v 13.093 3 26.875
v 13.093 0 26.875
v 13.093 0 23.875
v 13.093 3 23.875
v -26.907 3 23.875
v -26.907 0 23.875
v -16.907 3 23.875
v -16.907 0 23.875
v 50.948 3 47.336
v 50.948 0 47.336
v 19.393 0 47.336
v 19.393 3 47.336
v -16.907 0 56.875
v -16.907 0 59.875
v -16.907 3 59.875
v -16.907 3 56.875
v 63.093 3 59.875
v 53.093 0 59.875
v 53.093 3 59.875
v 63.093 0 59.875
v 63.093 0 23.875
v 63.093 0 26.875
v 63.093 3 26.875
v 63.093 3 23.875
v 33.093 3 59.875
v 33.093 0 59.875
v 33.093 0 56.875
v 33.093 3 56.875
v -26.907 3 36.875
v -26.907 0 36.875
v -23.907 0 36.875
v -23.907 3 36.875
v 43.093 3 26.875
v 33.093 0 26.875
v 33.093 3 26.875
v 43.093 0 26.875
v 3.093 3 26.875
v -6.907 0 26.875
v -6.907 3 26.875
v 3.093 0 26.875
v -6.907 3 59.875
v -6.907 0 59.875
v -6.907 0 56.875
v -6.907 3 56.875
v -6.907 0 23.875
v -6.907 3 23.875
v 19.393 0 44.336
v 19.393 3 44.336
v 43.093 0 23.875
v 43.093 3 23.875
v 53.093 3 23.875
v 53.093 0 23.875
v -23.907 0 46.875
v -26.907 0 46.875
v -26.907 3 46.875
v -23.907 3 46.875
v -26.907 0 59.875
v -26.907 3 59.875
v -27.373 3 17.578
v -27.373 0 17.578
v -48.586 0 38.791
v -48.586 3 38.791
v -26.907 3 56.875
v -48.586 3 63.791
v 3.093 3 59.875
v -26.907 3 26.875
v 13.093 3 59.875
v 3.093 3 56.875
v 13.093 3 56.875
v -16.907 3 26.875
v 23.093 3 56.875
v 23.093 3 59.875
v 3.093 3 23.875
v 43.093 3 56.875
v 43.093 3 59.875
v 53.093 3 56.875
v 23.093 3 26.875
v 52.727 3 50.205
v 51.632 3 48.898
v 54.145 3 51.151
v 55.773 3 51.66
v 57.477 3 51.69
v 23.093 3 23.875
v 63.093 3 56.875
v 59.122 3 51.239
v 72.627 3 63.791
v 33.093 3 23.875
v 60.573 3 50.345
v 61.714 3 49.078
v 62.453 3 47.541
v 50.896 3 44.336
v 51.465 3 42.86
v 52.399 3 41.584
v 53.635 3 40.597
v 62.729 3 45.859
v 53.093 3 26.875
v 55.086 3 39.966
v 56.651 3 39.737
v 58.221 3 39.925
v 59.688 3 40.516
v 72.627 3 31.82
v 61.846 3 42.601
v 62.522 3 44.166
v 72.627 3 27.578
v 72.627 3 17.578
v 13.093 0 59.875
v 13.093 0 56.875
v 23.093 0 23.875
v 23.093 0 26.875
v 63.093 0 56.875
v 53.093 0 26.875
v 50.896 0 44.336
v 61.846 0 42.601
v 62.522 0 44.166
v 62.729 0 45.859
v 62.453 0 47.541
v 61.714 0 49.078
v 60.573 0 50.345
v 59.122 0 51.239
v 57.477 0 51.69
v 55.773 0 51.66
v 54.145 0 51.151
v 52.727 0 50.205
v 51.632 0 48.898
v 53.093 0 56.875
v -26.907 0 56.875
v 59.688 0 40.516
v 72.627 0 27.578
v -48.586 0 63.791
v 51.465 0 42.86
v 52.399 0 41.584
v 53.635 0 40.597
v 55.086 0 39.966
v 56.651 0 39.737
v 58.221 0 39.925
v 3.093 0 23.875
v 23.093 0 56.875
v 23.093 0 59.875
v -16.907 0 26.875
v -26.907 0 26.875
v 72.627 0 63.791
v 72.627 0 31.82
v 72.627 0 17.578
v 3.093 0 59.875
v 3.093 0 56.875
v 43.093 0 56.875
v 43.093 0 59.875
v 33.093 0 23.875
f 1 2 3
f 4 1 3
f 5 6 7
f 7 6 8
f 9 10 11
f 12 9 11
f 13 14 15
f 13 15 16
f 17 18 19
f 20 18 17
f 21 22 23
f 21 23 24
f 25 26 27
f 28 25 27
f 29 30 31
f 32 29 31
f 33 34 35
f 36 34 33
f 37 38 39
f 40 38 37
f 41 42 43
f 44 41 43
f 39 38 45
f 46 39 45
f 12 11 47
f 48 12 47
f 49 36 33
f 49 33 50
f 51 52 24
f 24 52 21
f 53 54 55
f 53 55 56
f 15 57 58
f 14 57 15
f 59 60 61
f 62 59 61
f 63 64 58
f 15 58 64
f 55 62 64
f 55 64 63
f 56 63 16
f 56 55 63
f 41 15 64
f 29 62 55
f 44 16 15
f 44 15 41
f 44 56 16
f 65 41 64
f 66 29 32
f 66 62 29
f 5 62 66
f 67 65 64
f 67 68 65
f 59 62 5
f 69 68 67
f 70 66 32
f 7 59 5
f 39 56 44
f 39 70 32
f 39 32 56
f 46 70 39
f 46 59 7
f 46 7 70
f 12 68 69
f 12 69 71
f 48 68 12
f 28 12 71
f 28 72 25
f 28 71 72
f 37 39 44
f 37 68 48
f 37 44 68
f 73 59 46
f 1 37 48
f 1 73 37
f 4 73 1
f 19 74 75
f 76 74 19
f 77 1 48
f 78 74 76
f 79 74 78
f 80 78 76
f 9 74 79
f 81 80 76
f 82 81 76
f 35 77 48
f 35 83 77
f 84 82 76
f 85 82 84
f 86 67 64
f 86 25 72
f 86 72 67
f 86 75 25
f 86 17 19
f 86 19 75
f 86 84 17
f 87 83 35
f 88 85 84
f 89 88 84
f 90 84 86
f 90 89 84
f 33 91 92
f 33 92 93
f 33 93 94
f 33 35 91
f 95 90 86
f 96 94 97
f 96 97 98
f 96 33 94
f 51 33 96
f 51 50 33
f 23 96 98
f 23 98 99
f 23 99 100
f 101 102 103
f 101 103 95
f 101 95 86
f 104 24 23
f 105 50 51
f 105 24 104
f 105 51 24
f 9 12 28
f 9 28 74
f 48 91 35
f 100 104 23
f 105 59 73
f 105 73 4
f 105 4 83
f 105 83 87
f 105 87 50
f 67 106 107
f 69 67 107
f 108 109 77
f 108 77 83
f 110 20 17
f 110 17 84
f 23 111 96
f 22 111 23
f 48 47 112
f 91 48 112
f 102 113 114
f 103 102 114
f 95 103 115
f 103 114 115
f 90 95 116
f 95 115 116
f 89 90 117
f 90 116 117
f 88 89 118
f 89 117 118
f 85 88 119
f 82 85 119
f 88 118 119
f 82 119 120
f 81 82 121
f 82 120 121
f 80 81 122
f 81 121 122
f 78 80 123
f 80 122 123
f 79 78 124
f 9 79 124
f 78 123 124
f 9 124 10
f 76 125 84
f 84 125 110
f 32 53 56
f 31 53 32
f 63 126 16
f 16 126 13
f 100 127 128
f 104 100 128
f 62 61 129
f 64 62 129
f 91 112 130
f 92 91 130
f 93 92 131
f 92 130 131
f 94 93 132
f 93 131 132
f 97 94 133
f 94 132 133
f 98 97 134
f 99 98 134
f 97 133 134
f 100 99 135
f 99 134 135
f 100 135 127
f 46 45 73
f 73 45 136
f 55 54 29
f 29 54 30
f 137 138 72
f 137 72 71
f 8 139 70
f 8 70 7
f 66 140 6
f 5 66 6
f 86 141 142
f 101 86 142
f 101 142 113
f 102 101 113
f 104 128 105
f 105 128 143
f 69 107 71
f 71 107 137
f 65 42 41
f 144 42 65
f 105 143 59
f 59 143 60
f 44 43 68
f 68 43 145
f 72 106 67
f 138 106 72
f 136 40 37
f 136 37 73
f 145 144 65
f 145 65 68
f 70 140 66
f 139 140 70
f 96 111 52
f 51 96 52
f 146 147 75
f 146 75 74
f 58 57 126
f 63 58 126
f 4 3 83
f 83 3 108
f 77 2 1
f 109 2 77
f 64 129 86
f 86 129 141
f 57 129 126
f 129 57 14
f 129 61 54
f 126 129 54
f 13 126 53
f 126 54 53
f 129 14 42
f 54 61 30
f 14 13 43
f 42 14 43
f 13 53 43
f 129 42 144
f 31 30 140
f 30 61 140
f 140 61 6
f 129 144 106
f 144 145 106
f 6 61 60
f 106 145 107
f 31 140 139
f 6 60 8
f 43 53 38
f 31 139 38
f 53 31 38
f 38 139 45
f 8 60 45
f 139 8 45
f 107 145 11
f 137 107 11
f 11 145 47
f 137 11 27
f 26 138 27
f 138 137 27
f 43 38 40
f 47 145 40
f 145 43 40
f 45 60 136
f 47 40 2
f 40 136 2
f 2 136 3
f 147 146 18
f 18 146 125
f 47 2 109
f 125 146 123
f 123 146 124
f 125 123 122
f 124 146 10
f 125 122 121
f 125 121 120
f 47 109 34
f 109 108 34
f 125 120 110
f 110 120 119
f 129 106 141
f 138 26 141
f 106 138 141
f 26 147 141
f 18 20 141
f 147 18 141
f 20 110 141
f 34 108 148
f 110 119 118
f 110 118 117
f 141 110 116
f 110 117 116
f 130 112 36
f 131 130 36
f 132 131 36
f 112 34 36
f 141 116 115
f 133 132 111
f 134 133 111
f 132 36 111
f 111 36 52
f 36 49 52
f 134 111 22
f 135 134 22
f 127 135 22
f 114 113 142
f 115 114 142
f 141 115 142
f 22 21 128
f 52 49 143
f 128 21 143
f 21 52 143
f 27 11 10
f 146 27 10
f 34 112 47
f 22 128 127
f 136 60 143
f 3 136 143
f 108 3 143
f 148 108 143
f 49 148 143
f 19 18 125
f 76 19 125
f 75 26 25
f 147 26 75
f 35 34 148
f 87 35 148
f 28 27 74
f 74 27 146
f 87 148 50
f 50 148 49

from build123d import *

# Parameters (mm, degrees)
ESQUISSE1_W        = 10
ESQUISSE1_H        = 3
ESQUISSE1_W_2      = 3
ESQUISSE1_H_2      = 10
BOSS_EXTRU_1_DEPTH = 3


with BuildPart() as part:
    # Esquisse1 → Boss.-Extru.1 (new body)
    with BuildSketch(Plane(origin=(0, 0, 0), x_dir=(1, 0, 0), z_dir=(0, 1, 0))):
        with BuildLine():
            Line((-48.586354215, -63.79082471), (72.626849221, -63.79082471))
            Line((72.626849221, -63.79082471), (72.626849221, -31.820261962))
            Line((72.626849221, -31.820261962), (61.846203207, -42.600907976))
            ThreePointArc((61.846203207, -42.600907976), (59.121902654, -51.239420877), (50.947990526, -47.336488751))
            Line((50.947990526, -47.336488751), (19.393465144, -47.336488751))
            Line((19.393465144, -47.336488751), (19.393465144, -44.336488751))
            Line((19.393465144, -44.336488751), (50.896342586, -44.336488751))
            ThreePointArc((50.896342586, -44.336488751), (54.339544234, -40.233556625), (59.688362254, -40.516108241))
            Line((59.688362254, -40.516108241), (72.626849221, -27.577621274))
            Line((72.626849221, -27.577621274), (72.626849221, -17.577621274))
            Line((72.626849221, -17.577621274), (-27.373150779, -17.577621274))
            Line((-27.373150779, -17.577621274), (-48.586354215, -38.79082471))
            Line((-48.586354215, -38.79082471), (-48.586354215, -63.79082471))
        make_face()
        with Locations((-1.907227595, -25.374770958)):
            Rectangle(ESQUISSE1_W, ESQUISSE1_H, mode=Mode.SUBTRACT)
        with Locations((-21.907227595, -25.374770958)):
            Rectangle(ESQUISSE1_W, ESQUISSE1_H, mode=Mode.SUBTRACT)
        with Locations((18.092772405, -25.374770958)):
            Rectangle(ESQUISSE1_W, ESQUISSE1_H, mode=Mode.SUBTRACT)
        with Locations((38.092772405, -25.374770958)):
            Rectangle(ESQUISSE1_W, ESQUISSE1_H, mode=Mode.SUBTRACT)
        with Locations((58.092772405, -25.374770958)):
            Rectangle(ESQUISSE1_W, ESQUISSE1_H, mode=Mode.SUBTRACT)
        with Locations((-21.907227595, -58.374770958)):
            Rectangle(ESQUISSE1_W, ESQUISSE1_H, mode=Mode.SUBTRACT)
        with Locations((-1.907227595, -58.374770958)):
            Rectangle(ESQUISSE1_W, ESQUISSE1_H, mode=Mode.SUBTRACT)
        with Locations((18.092772405, -58.374770958)):
            Rectangle(ESQUISSE1_W, ESQUISSE1_H, mode=Mode.SUBTRACT)
        with Locations((38.092772405, -58.374770958)):
            Rectangle(ESQUISSE1_W, ESQUISSE1_H, mode=Mode.SUBTRACT)
        with Locations((58.092772405, -58.374770958)):
            Rectangle(ESQUISSE1_W, ESQUISSE1_H, mode=Mode.SUBTRACT)
        with Locations((-25.407227595, -41.874770958)):
            Rectangle(ESQUISSE1_W_2, ESQUISSE1_H_2, mode=Mode.SUBTRACT)
    extrude(amount=BOSS_EXTRU_1_DEPTH)


solid = part.part
